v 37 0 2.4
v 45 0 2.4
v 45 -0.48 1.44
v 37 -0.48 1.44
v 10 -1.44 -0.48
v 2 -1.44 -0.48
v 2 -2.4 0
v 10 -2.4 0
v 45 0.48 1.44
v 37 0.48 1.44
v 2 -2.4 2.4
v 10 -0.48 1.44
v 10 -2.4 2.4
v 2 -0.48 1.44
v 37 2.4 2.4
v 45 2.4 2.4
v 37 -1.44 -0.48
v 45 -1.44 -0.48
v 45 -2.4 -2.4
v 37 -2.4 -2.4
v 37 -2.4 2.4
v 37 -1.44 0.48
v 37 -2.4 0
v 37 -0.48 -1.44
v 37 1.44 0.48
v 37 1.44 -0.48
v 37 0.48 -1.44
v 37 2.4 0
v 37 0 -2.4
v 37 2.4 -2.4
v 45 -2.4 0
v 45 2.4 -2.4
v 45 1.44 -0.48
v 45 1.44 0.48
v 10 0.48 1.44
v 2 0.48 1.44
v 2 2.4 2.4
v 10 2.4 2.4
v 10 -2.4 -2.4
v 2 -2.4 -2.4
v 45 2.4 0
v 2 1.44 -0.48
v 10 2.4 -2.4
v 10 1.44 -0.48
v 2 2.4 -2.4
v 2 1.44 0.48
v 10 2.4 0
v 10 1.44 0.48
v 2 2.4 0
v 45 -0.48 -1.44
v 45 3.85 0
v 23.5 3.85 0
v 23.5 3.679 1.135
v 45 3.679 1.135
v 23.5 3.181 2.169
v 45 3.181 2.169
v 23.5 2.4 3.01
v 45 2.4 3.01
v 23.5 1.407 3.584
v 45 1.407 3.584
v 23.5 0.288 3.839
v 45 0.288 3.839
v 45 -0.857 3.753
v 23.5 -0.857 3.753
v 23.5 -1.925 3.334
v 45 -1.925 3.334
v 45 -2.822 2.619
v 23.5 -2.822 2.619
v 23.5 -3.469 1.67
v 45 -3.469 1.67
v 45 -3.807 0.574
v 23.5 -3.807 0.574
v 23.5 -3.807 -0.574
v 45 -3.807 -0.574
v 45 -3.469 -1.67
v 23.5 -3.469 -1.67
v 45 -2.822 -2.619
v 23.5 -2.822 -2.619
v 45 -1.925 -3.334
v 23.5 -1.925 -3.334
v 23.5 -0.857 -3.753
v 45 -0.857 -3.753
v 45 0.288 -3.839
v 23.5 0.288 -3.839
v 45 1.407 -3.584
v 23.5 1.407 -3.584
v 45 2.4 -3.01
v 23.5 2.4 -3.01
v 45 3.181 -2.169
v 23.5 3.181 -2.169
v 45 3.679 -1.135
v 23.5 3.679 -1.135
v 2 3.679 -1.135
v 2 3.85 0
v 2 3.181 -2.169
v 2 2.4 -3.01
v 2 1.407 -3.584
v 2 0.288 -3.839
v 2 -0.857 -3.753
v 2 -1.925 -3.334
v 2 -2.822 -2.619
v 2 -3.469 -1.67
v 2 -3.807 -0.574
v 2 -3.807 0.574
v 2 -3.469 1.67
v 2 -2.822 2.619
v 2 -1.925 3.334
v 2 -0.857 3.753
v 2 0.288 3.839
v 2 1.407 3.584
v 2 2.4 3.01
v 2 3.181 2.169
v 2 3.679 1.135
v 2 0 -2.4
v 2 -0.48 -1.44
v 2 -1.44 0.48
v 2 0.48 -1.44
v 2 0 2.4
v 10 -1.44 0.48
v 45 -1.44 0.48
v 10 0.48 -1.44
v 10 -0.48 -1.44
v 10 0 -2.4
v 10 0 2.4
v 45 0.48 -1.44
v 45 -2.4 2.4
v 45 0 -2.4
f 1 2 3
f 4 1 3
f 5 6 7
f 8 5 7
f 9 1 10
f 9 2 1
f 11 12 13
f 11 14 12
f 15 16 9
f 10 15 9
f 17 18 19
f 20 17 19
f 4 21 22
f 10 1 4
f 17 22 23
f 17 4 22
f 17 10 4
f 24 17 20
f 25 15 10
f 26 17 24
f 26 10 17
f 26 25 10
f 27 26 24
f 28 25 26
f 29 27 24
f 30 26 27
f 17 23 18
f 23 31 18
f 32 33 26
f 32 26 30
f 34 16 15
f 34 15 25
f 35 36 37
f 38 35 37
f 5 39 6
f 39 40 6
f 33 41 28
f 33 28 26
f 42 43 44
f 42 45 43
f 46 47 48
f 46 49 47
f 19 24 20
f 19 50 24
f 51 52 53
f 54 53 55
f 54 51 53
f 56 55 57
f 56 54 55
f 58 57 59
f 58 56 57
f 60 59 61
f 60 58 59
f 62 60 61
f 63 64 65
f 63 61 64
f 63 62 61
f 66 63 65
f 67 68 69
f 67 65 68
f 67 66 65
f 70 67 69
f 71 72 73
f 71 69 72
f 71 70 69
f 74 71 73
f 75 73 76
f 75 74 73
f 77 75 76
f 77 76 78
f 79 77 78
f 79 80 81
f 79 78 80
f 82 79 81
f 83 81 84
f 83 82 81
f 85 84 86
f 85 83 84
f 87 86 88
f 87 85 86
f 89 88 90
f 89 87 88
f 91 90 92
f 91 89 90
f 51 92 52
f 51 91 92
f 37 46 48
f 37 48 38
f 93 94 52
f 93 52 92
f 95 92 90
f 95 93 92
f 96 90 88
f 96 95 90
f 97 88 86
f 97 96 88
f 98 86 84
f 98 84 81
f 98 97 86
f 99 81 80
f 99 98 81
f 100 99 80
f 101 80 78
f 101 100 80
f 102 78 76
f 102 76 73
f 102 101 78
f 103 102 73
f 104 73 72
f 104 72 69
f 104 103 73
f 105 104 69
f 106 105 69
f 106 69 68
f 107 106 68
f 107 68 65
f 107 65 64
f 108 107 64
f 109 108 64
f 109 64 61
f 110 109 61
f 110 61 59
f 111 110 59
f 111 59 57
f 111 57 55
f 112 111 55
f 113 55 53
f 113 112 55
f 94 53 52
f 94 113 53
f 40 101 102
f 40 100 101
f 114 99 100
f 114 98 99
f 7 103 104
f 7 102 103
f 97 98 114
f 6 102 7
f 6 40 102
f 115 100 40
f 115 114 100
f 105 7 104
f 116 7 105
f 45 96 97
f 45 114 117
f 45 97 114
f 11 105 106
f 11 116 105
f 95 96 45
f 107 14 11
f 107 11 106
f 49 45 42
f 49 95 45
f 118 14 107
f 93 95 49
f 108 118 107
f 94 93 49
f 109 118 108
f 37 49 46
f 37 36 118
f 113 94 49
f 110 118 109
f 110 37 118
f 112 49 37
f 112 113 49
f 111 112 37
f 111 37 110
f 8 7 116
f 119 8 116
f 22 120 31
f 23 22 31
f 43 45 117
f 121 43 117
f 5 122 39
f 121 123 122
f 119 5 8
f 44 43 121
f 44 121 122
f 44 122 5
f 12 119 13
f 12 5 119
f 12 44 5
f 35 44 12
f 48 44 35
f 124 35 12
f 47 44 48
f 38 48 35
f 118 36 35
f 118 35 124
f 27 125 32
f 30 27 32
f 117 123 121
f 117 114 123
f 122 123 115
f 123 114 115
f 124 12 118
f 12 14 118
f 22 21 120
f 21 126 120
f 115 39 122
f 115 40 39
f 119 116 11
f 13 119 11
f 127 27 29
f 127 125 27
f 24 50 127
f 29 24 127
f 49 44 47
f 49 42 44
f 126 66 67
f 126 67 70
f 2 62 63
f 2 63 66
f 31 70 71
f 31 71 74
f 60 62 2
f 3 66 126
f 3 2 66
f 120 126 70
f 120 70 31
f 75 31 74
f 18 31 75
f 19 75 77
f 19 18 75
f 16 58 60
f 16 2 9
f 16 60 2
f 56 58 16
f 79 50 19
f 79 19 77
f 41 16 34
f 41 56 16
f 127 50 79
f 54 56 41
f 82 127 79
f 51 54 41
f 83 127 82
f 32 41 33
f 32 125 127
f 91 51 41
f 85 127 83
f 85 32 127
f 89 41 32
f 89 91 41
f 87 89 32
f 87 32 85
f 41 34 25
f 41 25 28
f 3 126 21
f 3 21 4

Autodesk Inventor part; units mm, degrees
ref_plane "YZ Plane" through (0, 0, 0) normal (1, 0, 0) x (0, 1, 0)
ref_plane "XZ Plane" through (0, 0, 0) normal (0, 1, 0) x (-1, 0, 0)
ref_plane "XY Plane" through (0, 0, 0) normal (0, 0, 1) x (1, 0, 0)
sketch "Sketch1" plane through (0, 0, 0) normal (1, 0, 0) x (0, 1, 0)
  circle A0 centre (0, 0) radius 3.85
  dimension "d0" = 7.7
extrude "Extrusion1" add sketch "Sketch1" along normal blind 5
sketch "Sketch2" plane through (5, 0, 0) normal (1, 0, 0) x (0, 0, -1)
  circle A0 centre (0, 0) radius 3.85
  dimension "d3" = 7.7
extrude "Extrusion2" add sketch "Sketch2" along normal blind 18.5
sketch "Sketch5" plane through (0, 0, 0) normal (-1, 0, 0) x (0, 0, 1)
  circle A0 centre (0, 0) radius 2.4
  line L0 (0, 0) -> (-2.4, 0)
  line L1 (-2.4, 0) -> (-2.4, 2.4)
  line L2 (-2.4, 2.4) -> (0, 2.4)
  line L3 (0, 2.4) -> (0, 0)
  line L4 (-2.4, 2.4) -> (2.4, 2.4)
  line L5 (2.4, 2.4) -> (2.4, -2.4)
  line L6 (2.4, -2.4) -> (-2.4, -2.4)
  line L7 (-2.4, -2.4) -> (-2.4, 2.4)
  line L8 (-2.4, 2.4) -> (2.4, 0)
  line L9 (-2.4, -2.4) -> (2.4, 0)
  line L10 (-2.4, 0) -> (2.4, 2.4)
  line L11 (-2.4, 0) -> (2.4, -2.4)
  line L12 (0, 2.4) -> (2.4, -2.4)
  line L13 (-2.4, -2.4) -> (0, 2.4)
  line L14 (-2.4, 2.4) -> (0, -2.4)
  line L15 (0, -2.4) -> (2.4, 2.4)
  point P0 (1.44, -0.48)
  point P1 (1.44, 0.48)
  point P2 (0.48, 1.44)
  point P3 (-0.48, 1.44)
  point P4 (-1.44, 0.48)
  point P5 (-1.44, -0.48)
  point P6 (-0.48, -1.44)
  point P7 (0.48, -1.44)
  dimension "d23" = 4.8
extrude "Extrusion5" cut sketch "Sketch5" against normal blind 10 contours L9 L12 L15 L8 | L15 L8 L12 L10 A0 | A0 L10 L15 | L12 L11 A0 | A0 L11 L15 L9 L12 | L15 L12 L8 | L9 L15 L12 | L12 L10 L3 | L3 L8 L13 | L14 L9 L11 L15 | L12 L15 L9 L11 L14 L0 L3 L8 | L8 L10 L12 | L15 L11 L9 | L8 L13 L10 L14 A0 | A0 L14 L8 | L10 L13 L8 | L3 L0 L13 L10 | L9 L13 A0 | A0 L13 L11 L14 L9 | L14 L11 L9 | L10 L14 L0 | L0 L13 L11 | L13 L14 L10 | L11 L13 L14
sketch "Sketch7" plane through (0, 0, 0) normal (-1, 0, 0) x (0, 0, 1)
  circle A0 centre (0, 0) radius 3.85
extrude "Extrusion7" cut sketch "Sketch7" against normal blind 2
mirror "Mirror1" about plane through (23.5, 0, 0) normal (1, 0, 0)
properties part number "gear_shaft"
